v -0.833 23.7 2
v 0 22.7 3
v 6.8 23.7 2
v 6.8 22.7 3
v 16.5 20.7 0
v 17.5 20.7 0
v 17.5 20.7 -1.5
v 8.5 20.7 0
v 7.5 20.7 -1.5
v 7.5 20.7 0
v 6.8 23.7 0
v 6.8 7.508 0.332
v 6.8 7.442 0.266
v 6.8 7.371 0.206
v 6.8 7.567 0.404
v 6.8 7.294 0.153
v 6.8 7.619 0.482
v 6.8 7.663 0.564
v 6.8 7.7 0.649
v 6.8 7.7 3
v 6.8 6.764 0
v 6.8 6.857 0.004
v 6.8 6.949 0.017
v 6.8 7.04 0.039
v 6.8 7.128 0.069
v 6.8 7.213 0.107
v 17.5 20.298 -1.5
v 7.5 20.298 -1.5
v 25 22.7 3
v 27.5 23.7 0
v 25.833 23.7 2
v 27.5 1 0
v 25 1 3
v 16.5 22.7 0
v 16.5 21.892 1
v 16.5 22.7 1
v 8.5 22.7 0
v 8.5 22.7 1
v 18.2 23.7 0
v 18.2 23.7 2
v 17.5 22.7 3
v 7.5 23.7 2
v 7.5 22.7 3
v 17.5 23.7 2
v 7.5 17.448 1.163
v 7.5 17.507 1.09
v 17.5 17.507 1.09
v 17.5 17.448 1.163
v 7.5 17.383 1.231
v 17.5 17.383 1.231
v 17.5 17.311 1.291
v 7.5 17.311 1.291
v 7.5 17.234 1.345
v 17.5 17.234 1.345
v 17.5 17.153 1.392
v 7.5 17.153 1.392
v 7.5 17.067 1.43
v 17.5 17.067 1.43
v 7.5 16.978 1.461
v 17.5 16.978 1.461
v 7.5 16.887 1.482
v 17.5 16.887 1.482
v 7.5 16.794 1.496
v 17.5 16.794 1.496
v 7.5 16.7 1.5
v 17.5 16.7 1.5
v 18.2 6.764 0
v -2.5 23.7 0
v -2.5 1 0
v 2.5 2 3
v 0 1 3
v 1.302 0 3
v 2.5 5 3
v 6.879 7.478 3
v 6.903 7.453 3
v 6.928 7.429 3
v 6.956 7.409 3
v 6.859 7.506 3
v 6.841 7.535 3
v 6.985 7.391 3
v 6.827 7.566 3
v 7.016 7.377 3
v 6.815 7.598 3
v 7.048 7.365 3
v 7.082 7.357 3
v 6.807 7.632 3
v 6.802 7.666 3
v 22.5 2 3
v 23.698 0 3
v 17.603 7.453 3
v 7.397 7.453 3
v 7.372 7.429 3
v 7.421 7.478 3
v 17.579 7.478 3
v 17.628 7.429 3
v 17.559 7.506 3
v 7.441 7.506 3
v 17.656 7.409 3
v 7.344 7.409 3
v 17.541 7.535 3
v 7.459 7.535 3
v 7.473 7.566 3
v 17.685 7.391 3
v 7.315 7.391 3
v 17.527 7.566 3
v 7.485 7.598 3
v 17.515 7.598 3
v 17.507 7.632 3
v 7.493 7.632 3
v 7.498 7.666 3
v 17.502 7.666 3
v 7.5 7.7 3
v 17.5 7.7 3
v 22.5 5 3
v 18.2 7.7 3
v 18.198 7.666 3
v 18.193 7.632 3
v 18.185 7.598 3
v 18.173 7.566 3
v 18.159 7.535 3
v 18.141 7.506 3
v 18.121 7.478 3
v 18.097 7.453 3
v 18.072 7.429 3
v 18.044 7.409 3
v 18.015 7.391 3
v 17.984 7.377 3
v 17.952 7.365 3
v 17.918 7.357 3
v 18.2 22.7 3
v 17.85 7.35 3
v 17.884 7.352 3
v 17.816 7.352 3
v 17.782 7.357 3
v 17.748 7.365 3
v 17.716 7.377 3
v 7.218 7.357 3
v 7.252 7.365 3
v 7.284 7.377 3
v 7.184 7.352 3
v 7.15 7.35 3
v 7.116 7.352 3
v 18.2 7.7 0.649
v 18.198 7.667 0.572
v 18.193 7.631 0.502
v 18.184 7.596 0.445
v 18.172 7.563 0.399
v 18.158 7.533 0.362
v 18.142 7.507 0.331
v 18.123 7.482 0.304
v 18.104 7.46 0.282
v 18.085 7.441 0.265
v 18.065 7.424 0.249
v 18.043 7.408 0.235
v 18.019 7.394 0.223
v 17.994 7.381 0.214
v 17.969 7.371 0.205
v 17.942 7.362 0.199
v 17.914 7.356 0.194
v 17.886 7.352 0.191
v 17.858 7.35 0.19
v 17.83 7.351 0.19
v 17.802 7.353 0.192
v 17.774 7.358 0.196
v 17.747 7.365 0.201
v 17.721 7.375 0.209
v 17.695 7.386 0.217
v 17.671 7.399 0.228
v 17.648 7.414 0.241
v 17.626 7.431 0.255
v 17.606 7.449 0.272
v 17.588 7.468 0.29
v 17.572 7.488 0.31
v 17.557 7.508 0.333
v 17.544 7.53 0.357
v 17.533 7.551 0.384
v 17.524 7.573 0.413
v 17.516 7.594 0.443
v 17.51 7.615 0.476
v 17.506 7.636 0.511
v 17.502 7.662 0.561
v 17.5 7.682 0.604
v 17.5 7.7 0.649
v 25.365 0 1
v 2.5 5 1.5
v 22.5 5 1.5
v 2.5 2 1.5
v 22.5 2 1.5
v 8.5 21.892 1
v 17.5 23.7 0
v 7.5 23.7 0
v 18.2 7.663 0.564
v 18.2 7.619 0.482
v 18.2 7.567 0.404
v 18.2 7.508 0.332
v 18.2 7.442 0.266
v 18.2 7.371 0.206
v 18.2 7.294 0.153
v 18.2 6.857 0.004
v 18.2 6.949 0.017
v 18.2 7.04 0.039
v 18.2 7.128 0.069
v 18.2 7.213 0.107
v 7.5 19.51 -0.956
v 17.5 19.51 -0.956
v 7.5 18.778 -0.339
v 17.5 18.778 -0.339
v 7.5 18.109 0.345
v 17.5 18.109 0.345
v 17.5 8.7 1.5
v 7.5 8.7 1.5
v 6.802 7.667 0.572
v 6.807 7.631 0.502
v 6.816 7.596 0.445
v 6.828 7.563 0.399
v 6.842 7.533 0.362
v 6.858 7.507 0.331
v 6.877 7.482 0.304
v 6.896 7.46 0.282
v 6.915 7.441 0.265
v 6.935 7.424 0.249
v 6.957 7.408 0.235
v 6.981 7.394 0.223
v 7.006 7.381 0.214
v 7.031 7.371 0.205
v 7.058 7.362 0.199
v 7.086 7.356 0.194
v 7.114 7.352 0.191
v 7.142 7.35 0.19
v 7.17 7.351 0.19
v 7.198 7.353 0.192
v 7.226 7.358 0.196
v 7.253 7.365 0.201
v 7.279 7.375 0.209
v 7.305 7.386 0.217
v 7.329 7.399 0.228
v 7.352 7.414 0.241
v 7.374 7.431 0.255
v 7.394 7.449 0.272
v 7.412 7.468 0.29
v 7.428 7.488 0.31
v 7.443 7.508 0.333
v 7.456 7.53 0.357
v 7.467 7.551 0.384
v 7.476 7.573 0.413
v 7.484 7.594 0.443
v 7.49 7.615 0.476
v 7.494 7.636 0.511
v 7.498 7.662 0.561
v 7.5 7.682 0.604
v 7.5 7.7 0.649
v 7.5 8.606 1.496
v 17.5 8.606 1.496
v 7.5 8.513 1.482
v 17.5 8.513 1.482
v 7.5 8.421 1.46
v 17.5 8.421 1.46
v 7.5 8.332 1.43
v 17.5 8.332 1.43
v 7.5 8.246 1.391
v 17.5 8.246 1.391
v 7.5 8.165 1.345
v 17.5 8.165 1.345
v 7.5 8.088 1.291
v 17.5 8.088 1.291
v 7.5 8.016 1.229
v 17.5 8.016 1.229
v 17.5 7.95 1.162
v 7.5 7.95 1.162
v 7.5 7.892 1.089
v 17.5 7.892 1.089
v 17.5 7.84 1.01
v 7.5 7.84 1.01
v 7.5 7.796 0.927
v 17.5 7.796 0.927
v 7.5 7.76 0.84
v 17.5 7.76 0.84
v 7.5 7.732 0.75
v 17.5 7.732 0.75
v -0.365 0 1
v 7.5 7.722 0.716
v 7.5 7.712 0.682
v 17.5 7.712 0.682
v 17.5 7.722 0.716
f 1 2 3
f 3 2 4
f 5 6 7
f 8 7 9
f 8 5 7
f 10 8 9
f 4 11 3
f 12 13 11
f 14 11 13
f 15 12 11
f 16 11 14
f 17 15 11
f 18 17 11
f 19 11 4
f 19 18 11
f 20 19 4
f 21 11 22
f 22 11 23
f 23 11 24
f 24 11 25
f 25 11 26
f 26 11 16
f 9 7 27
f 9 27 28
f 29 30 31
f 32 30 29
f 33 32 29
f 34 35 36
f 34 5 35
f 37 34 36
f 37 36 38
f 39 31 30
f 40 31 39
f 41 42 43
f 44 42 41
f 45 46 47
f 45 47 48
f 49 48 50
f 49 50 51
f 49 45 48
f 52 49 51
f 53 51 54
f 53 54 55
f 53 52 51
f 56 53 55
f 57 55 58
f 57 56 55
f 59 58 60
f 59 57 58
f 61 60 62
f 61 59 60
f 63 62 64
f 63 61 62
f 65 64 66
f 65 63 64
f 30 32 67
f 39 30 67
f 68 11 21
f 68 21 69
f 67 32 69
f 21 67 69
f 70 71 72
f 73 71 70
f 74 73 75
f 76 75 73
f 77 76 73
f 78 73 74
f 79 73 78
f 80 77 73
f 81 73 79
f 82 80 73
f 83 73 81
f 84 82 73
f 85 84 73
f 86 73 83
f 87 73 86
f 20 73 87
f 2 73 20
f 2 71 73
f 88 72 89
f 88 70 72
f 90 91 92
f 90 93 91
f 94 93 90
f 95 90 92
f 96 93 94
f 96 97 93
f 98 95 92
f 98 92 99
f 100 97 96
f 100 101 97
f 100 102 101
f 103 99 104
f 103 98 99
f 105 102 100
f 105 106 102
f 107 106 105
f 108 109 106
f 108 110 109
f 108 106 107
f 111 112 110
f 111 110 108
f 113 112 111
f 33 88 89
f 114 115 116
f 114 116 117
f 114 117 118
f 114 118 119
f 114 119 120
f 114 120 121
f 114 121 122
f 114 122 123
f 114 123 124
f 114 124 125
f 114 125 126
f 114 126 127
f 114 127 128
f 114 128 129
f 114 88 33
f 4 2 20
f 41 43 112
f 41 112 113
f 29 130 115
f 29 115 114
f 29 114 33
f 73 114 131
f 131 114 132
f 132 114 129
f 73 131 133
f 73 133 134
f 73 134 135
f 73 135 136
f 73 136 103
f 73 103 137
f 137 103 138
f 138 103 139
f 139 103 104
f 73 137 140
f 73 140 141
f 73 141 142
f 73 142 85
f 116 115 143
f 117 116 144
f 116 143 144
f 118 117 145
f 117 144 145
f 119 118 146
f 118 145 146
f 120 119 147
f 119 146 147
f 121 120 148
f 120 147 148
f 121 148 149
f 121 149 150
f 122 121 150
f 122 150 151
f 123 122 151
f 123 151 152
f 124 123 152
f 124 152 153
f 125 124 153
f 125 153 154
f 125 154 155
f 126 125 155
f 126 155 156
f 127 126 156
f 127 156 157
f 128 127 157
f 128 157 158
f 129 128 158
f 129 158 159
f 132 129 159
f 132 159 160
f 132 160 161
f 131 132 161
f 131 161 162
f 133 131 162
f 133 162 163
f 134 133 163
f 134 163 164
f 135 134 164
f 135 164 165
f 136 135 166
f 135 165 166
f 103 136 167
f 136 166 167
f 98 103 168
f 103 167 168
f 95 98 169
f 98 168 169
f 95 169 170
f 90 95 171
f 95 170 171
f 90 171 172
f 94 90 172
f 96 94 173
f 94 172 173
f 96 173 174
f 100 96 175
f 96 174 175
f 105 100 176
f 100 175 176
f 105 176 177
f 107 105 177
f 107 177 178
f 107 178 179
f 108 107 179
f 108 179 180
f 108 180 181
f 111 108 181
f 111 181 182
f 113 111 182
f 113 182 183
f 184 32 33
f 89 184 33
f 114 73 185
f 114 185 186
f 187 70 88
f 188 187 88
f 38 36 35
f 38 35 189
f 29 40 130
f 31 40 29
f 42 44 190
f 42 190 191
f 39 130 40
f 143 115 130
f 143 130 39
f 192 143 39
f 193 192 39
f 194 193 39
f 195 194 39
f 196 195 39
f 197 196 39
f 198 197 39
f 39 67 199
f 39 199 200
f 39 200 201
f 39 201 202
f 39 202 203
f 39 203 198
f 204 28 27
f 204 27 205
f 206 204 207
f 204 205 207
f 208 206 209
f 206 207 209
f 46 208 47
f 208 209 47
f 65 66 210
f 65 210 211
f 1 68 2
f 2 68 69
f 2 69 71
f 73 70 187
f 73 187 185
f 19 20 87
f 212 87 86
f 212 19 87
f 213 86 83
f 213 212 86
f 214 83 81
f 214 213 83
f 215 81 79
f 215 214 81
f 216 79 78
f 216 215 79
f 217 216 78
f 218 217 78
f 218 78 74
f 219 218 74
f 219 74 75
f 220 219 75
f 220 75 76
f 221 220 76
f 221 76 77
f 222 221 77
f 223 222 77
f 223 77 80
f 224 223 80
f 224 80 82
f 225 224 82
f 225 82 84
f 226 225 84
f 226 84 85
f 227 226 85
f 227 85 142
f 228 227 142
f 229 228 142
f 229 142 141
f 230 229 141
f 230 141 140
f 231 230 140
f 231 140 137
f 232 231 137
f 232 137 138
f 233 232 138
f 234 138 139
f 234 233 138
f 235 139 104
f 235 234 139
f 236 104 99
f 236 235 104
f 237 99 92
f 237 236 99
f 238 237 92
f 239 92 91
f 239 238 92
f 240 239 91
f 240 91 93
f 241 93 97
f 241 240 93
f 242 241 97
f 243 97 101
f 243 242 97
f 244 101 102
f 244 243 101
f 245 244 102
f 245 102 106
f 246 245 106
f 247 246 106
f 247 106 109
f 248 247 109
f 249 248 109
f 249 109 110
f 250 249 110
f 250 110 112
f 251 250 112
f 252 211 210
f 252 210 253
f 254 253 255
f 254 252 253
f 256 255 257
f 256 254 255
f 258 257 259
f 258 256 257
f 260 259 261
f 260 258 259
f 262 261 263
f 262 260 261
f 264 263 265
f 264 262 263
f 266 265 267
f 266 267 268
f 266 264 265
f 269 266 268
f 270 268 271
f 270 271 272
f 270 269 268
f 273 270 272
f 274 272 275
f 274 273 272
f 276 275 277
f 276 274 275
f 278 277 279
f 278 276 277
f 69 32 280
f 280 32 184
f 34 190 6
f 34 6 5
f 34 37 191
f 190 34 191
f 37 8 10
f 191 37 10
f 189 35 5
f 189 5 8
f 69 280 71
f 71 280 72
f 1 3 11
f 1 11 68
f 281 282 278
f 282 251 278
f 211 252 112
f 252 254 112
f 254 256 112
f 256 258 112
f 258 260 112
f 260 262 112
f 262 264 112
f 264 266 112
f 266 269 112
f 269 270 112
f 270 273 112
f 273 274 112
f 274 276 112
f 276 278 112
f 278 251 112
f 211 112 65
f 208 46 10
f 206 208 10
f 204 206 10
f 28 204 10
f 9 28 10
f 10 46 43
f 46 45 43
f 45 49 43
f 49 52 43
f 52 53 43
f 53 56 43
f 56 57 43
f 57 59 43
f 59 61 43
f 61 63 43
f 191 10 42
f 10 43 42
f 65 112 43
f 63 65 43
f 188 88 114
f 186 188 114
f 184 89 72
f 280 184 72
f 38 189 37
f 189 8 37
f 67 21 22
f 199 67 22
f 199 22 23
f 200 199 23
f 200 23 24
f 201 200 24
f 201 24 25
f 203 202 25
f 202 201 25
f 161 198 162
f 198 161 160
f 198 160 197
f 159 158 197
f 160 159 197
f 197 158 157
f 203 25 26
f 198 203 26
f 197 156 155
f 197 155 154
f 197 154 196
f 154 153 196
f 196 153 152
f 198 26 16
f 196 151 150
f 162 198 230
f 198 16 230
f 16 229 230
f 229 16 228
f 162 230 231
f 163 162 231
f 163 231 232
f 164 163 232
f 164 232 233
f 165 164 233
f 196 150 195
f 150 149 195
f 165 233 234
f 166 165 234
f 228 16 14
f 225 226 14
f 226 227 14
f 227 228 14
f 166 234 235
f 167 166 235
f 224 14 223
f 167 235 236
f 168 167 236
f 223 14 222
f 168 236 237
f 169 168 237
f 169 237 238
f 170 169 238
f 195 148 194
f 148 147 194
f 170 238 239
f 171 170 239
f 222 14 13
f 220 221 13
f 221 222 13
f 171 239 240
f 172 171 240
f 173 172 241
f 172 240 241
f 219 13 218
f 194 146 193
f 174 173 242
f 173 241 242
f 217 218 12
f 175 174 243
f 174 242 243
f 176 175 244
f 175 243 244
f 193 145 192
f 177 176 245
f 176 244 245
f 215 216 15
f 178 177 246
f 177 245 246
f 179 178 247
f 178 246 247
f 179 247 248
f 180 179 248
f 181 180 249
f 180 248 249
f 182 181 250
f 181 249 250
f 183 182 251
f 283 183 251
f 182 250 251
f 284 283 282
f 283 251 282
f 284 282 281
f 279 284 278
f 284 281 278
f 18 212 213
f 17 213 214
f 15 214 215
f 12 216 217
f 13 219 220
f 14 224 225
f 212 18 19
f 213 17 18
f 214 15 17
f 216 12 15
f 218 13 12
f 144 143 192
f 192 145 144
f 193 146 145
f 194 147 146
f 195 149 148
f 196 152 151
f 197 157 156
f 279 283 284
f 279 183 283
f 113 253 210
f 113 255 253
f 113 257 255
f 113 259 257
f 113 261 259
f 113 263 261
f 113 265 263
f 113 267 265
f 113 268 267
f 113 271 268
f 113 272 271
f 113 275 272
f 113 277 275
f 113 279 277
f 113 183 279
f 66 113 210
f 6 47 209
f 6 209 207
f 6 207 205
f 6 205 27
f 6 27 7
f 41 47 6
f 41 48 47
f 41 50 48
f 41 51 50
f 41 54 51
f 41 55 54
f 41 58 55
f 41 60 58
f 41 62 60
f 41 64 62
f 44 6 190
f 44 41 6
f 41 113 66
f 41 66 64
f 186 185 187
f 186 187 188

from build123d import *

# Parameters (mm, degrees)
SKETCH1_W           = 25
SKETCH1_H           = 23.7
BOSS_EXTRUDE1_DEPTH = 3
BOSS_EXTRUDE2_DEPTH = 23.7
SKETCH4_W           = 10
SKETCH4_H           = 10
CUT_EXTRUDE1_DEPTH  = 1.5
CUT_EXTRUDE2_DEPTH  = 3
SKETCH6_W           = 10
SKETCH6_H           = 3
BOSS_EXTRUDE3_DEPTH = 1.5
CHAMFER1_SIZE       = 1.5
CHAMFER1_SIZE2      = 2.598076211
SKETCH7_W           = 20
SKETCH7_H           = 3
CUT_EXTRUDE3_DEPTH  = 1.5
FILLET1_R           = 1
SKETCH8_W           = 8
SKETCH8_H           = 2
CUT_EXTRUDE4_DEPTH  = 1
FILLET2_R           = 10
FILLET3_R           = 1
CHAMFER3_SIZE       = 1
CHAMFER4_SIZE       = 1
CHAMFER5_SIZE       = 1
CHAMFER5_SIZE2      = 1.191753593


with BuildPart() as part:
    # Sketch1 → Boss-Extrude1 (new body)
    with BuildSketch(Plane.XY):
        with Locations((12.5, 11.85)):
            Rectangle(SKETCH1_W, SKETCH1_H)
    extrude(amount=BOSS_EXTRUDE1_DEPTH)

    # Sketch2 → Boss-Extrude2 (add)
    with BuildSketch(Plane.XZ):
        Polygon((0, 0), (-2.5, 0), (0, 3), align=None)
        Polygon((25, 0), (27.5, 0), (25, 3), align=None)
    extrude(amount=-BOSS_EXTRUDE2_DEPTH)

    # Sketch4 → Cut-Extrude1 (cut)
    with BuildSketch(Plane(origin=(0, 0, 0), x_dir=(-1, 0, 0), z_dir=(0, 0, -1))):
        with Locations((-12.5, 12.7)):
            Rectangle(SKETCH4_W, SKETCH4_H)
    extrude(amount=-CUT_EXTRUDE1_DEPTH, mode=Mode.SUBTRACT)

    # Sketch5 → Cut-Extrude2 (cut)
    with BuildSketch(Plane(origin=(0, 0, 0), x_dir=(-1, 0, 0), z_dir=(0, 0, -1))):
        with BuildLine():
            Line((-17.5, 7.7), (-17.5, 23.7))
            Line((-17.5, 23.7), (-18.2, 23.7))
            Line((-18.2, 23.7), (-18.2, 7.7))
            ThreePointArc((-18.2, 7.7), (-17.85, 7.35), (-17.5, 7.7))
        make_face()
        with BuildLine():
            Line((-7.5, 7.7), (-7.5, 23.7))
            Line((-7.5, 23.7), (-6.8, 23.7))
            Line((-6.8, 23.7), (-6.8, 7.7))
            ThreePointArc((-6.8, 7.7), (-7.15, 7.35), (-7.5, 7.7))
        make_face()
    extrude(amount=-CUT_EXTRUDE2_DEPTH, mode=Mode.SUBTRACT)

    # Sketch6 → Boss-Extrude3 (add)
    with BuildSketch(Plane(origin=(0, 0, 0), x_dir=(-1, 0, 0), z_dir=(0, 0, -1))):
        with Locations((-12.5, 19.2)):
            Rectangle(SKETCH6_W, SKETCH6_H)
    extrude(amount=BOSS_EXTRUDE3_DEPTH)

    # Chamfer1
    chamfer1_edges = [part.edges().sort_by_distance(p)[0] for p in [
        (12.5, 17.7, -1.5),
    ]]
    chamfer1_side = [part.faces().sort_by_distance(p)[0] for p in [
        (12.5, 17.7, 0),
    ]]
    chamfer(chamfer1_edges, length=CHAMFER1_SIZE, length2=CHAMFER1_SIZE2, reference=chamfer1_side[0])

    # Sketch7 → Cut-Extrude3 (cut)
    with BuildSketch(Plane.XY.offset(3)):
        with Locations((12.5, 3.5)):
            Rectangle(SKETCH7_W, SKETCH7_H)
    extrude(amount=-CUT_EXTRUDE3_DEPTH, mode=Mode.SUBTRACT)

    # Fillet1
    fillet1_edges = [part.edges().sort_by_distance(p)[0] for p in [
        (12.5, 17.7, 1.5),
        (12.5, 7.7, 1.5),
    ]]
    fillet(fillet1_edges, radius=FILLET1_R)

    # Sketch8 → Cut-Extrude4 (cut)
    with BuildSketch(Plane(origin=(0, 0, 0), x_dir=(-1, 0, 0), z_dir=(0, 0, -1))):
        with Locations((-12.5, 21.7)):
            Rectangle(SKETCH8_W, SKETCH8_H)
    extrude(amount=-CUT_EXTRUDE4_DEPTH, mode=Mode.SUBTRACT)

    # Fillet2
    # the kernel refuses this fillet: 10 mm, written as the material it takes off along each edge
    with BuildSketch(Plane(origin=(25, 17.7, 0), x_dir=(0, -0.17402760364384265, 0.9847407746051655), z_dir=(-1, 0, 0))) as fillet2_piece_1_section:
        with BuildLine():
            CenterArc((5.512472708, 8.977269728), FILLET2_R, 221.911963519, 21.948914507)
            Line((-1.929248139, 2.297390175), (-2.673420224, 1.62940222))
            ThreePointArc((-2.673420224, 1.62940222), (-1.730420795, 0.505612375), (-0.765796725, -0.643082713))
            Line((-0.765796725, -0.643082713), (0.174027604, -0.984740775))
            Line((0.174027604, -0.984740775), (0.666397991, -0.897726973))
            Line((0.666397991, -0.897726973), (1.106950238, 0))
        make_face()
    fillet2_piece_1 = extrude(amount=25, mode=Mode.PRIVATE)
    fillet2_piece_1 = split(fillet2_piece_1, bisect_by=Plane(origin=(18.2, 17.7, 0), z_dir=(-1, 0, 0)), keep=Keep.TOP, mode=Mode.PRIVATE)
    fillet2_piece_1 = split(fillet2_piece_1, bisect_by=Plane(origin=(6.8, 17.7, 0), z_dir=(1, 0, 0)), keep=Keep.TOP, mode=Mode.PRIVATE)
    add(fillet2_piece_1, mode=Mode.SUBTRACT)

    # Fillet3
    # the kernel refuses this fillet: 1 mm, written as the material it takes off along each edge
    with BuildSketch(Plane(origin=(5.158770817, 7.7, 0), x_dir=(0, -1, 0), z_dir=(1, 0, 0))) as fillet3_piece_1_section:
        with BuildLine():
            CenterArc((0.936491673, -1), FILLET3_R, 90, 75.522487814)
            Line((-0.031754163, -0.75), (-0.128578747, -0.725))
            ThreePointArc((-0.128578747, -0.725), (-0.1, -0.5), (-0.1, 0))
            Line((-0.1, 0), (0, 0.1))
            Line((0, 0.1), (0.936491673, 0.1))
            Line((0.936491673, 0.1), (0.936491673, 0))
        make_face()
    fillet3_piece_1 = extrude(amount=14.682458366, mode=Mode.PRIVATE)
    fillet3_piece_1 = split(fillet3_piece_1, bisect_by=Plane(origin=(6.8, 7.7, 0), z_dir=(1, 0, 0)), keep=Keep.TOP, mode=Mode.PRIVATE)
    fillet3_piece_1 = split(fillet3_piece_1, bisect_by=Plane(origin=(18.2, 7.7, 0), z_dir=(-1, 0, 0)), keep=Keep.TOP, mode=Mode.PRIVATE)
    add(fillet3_piece_1, mode=Mode.SUBTRACT)

    # Chamfer3
    chamfer3_edges = [part.edges().sort_by_distance(p)[0] for p in [
        (-1.25, 0, 1.5),
        (26.25, 0, 1.5),
        (12.5, 0, 0),
    ]]
    chamfer(chamfer3_edges, length=CHAMFER3_SIZE)

    # Chamfer4
    chamfer4_edges = [part.edges().sort_by_distance(p)[0] for p in [
        (21.6, 23.7, 3),
        (12.5, 23.7, 3),
        (3.4, 23.7, 3),
    ]]
    chamfer(chamfer4_edges, length=CHAMFER4_SIZE)

    # Chamfer5
    chamfer5_edges = [part.edges().sort_by_distance(p)[0] for p in [
        (12.5, 20.7, 1),
    ]]
    chamfer5_side = [part.faces().sort_by_distance(p)[0] for p in [
        (12.5, 20.7, -0.315217391),
    ]]
    chamfer(chamfer5_edges, length=CHAMFER5_SIZE, length2=CHAMFER5_SIZE2, reference=chamfer5_side[0])


solid = part.part
